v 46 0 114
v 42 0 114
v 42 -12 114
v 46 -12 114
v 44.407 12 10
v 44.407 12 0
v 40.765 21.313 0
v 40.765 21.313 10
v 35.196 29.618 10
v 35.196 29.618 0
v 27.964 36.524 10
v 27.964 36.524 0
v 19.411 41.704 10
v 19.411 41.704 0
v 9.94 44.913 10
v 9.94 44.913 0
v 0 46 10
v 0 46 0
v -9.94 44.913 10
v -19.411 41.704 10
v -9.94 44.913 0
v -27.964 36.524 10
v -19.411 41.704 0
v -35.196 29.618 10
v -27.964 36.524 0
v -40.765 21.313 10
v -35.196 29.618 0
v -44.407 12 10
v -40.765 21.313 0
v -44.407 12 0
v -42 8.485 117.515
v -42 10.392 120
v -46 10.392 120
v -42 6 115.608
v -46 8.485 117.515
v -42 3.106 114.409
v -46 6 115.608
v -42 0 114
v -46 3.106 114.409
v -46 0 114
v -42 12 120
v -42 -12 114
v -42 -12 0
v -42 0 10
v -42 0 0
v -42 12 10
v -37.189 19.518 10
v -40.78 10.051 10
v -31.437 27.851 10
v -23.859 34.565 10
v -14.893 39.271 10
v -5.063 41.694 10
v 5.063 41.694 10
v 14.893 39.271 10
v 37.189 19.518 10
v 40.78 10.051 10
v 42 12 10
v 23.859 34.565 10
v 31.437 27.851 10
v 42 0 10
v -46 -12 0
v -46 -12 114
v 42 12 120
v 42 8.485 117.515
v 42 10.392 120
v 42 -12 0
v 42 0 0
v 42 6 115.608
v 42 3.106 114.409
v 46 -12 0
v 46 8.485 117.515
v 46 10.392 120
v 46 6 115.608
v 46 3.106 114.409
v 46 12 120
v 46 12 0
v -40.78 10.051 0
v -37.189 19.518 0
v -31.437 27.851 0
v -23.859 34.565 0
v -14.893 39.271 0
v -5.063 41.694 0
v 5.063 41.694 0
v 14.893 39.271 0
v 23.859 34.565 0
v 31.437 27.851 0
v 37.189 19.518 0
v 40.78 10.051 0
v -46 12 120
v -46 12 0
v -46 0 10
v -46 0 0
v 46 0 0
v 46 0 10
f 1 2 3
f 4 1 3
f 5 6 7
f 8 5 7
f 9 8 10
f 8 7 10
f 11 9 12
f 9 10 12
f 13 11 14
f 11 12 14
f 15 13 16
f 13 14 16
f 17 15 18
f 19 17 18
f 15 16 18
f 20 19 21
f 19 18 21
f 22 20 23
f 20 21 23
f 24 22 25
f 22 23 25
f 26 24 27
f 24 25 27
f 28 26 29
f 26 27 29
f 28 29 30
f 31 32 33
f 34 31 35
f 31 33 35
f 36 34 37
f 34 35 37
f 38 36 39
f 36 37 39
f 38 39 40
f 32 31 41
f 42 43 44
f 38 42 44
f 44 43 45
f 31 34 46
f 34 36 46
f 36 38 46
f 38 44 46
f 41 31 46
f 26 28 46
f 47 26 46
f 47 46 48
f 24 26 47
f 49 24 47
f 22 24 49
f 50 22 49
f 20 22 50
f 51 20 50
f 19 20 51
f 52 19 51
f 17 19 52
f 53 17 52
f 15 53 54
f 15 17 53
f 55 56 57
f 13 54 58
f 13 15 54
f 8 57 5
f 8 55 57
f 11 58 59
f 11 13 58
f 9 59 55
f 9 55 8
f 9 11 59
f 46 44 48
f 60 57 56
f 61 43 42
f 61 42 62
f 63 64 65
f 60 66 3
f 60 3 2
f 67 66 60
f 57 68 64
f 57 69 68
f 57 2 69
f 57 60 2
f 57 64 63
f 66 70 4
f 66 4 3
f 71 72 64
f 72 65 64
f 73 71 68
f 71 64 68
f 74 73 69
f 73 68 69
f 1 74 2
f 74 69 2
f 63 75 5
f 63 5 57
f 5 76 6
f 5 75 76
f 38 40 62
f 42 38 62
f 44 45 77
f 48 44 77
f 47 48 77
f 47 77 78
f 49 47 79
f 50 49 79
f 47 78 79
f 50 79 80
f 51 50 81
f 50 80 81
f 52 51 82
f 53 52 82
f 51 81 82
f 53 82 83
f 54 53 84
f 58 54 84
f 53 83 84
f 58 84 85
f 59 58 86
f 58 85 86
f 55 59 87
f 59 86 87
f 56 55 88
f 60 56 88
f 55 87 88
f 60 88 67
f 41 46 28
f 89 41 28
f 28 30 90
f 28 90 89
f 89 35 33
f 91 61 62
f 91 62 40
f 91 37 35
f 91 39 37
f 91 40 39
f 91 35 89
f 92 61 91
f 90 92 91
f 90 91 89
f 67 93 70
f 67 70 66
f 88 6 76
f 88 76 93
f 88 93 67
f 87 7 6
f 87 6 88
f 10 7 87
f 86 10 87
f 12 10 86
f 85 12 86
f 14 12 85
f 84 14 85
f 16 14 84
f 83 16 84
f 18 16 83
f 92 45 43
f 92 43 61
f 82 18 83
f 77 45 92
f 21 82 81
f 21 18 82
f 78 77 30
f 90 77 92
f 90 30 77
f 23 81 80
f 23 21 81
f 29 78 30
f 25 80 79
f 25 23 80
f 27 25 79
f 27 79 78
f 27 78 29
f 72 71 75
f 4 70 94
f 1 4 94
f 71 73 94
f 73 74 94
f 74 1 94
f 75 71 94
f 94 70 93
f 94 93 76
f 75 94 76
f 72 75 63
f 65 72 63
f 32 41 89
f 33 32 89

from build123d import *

# Parameters (mm, degrees)
EXTRUDE_1_DEPTH     = 10
SKETCH_3_W          = 4
SKETCH_3_H          = 24
EXTRUDE_2_DEPTH     = 120
CUT_EXTRUDE_1_DEPTH = 120


with BuildPart() as part:
    # 草图2 → 凸台-拉伸1 (new body)
    with BuildSketch(Plane.XY):
        with BuildLine():
            Line((-46, 0), (-42, 0))
            ThreePointArc((-42, 0), (0, 42), (42, 0))
            Line((42, 0), (46, 0))
            ThreePointArc((46, 0), (0, 46), (-46, 0))
        make_face()
    extrude(amount=EXTRUDE_1_DEPTH)

    # 草图3 → 凸台-拉伸2 (add)
    with BuildSketch(Plane(origin=(0, 0, 0), x_dir=(-1, 0, 0), z_dir=(0, 0, -1))):
        with Locations((-44, 0)):
            Rectangle(SKETCH_3_W, SKETCH_3_H)
        with Locations((44, 0)):
            Rectangle(SKETCH_3_W, SKETCH_3_H)
    extrude(amount=-EXTRUDE_2_DEPTH)

    # 草图4 → 切除-拉伸1 (cut)
    with BuildSketch(Plane.ZY.offset(46)):
        with BuildLine():
            Line((114, 0), (114, -12))
            Line((114, -12), (126, -12))
            ThreePointArc((126, -12), (134.485281374, 8.485281374), (114, 0))
        make_face()
    extrude(amount=-CUT_EXTRUDE_1_DEPTH, mode=Mode.SUBTRACT)


solid = part.part
